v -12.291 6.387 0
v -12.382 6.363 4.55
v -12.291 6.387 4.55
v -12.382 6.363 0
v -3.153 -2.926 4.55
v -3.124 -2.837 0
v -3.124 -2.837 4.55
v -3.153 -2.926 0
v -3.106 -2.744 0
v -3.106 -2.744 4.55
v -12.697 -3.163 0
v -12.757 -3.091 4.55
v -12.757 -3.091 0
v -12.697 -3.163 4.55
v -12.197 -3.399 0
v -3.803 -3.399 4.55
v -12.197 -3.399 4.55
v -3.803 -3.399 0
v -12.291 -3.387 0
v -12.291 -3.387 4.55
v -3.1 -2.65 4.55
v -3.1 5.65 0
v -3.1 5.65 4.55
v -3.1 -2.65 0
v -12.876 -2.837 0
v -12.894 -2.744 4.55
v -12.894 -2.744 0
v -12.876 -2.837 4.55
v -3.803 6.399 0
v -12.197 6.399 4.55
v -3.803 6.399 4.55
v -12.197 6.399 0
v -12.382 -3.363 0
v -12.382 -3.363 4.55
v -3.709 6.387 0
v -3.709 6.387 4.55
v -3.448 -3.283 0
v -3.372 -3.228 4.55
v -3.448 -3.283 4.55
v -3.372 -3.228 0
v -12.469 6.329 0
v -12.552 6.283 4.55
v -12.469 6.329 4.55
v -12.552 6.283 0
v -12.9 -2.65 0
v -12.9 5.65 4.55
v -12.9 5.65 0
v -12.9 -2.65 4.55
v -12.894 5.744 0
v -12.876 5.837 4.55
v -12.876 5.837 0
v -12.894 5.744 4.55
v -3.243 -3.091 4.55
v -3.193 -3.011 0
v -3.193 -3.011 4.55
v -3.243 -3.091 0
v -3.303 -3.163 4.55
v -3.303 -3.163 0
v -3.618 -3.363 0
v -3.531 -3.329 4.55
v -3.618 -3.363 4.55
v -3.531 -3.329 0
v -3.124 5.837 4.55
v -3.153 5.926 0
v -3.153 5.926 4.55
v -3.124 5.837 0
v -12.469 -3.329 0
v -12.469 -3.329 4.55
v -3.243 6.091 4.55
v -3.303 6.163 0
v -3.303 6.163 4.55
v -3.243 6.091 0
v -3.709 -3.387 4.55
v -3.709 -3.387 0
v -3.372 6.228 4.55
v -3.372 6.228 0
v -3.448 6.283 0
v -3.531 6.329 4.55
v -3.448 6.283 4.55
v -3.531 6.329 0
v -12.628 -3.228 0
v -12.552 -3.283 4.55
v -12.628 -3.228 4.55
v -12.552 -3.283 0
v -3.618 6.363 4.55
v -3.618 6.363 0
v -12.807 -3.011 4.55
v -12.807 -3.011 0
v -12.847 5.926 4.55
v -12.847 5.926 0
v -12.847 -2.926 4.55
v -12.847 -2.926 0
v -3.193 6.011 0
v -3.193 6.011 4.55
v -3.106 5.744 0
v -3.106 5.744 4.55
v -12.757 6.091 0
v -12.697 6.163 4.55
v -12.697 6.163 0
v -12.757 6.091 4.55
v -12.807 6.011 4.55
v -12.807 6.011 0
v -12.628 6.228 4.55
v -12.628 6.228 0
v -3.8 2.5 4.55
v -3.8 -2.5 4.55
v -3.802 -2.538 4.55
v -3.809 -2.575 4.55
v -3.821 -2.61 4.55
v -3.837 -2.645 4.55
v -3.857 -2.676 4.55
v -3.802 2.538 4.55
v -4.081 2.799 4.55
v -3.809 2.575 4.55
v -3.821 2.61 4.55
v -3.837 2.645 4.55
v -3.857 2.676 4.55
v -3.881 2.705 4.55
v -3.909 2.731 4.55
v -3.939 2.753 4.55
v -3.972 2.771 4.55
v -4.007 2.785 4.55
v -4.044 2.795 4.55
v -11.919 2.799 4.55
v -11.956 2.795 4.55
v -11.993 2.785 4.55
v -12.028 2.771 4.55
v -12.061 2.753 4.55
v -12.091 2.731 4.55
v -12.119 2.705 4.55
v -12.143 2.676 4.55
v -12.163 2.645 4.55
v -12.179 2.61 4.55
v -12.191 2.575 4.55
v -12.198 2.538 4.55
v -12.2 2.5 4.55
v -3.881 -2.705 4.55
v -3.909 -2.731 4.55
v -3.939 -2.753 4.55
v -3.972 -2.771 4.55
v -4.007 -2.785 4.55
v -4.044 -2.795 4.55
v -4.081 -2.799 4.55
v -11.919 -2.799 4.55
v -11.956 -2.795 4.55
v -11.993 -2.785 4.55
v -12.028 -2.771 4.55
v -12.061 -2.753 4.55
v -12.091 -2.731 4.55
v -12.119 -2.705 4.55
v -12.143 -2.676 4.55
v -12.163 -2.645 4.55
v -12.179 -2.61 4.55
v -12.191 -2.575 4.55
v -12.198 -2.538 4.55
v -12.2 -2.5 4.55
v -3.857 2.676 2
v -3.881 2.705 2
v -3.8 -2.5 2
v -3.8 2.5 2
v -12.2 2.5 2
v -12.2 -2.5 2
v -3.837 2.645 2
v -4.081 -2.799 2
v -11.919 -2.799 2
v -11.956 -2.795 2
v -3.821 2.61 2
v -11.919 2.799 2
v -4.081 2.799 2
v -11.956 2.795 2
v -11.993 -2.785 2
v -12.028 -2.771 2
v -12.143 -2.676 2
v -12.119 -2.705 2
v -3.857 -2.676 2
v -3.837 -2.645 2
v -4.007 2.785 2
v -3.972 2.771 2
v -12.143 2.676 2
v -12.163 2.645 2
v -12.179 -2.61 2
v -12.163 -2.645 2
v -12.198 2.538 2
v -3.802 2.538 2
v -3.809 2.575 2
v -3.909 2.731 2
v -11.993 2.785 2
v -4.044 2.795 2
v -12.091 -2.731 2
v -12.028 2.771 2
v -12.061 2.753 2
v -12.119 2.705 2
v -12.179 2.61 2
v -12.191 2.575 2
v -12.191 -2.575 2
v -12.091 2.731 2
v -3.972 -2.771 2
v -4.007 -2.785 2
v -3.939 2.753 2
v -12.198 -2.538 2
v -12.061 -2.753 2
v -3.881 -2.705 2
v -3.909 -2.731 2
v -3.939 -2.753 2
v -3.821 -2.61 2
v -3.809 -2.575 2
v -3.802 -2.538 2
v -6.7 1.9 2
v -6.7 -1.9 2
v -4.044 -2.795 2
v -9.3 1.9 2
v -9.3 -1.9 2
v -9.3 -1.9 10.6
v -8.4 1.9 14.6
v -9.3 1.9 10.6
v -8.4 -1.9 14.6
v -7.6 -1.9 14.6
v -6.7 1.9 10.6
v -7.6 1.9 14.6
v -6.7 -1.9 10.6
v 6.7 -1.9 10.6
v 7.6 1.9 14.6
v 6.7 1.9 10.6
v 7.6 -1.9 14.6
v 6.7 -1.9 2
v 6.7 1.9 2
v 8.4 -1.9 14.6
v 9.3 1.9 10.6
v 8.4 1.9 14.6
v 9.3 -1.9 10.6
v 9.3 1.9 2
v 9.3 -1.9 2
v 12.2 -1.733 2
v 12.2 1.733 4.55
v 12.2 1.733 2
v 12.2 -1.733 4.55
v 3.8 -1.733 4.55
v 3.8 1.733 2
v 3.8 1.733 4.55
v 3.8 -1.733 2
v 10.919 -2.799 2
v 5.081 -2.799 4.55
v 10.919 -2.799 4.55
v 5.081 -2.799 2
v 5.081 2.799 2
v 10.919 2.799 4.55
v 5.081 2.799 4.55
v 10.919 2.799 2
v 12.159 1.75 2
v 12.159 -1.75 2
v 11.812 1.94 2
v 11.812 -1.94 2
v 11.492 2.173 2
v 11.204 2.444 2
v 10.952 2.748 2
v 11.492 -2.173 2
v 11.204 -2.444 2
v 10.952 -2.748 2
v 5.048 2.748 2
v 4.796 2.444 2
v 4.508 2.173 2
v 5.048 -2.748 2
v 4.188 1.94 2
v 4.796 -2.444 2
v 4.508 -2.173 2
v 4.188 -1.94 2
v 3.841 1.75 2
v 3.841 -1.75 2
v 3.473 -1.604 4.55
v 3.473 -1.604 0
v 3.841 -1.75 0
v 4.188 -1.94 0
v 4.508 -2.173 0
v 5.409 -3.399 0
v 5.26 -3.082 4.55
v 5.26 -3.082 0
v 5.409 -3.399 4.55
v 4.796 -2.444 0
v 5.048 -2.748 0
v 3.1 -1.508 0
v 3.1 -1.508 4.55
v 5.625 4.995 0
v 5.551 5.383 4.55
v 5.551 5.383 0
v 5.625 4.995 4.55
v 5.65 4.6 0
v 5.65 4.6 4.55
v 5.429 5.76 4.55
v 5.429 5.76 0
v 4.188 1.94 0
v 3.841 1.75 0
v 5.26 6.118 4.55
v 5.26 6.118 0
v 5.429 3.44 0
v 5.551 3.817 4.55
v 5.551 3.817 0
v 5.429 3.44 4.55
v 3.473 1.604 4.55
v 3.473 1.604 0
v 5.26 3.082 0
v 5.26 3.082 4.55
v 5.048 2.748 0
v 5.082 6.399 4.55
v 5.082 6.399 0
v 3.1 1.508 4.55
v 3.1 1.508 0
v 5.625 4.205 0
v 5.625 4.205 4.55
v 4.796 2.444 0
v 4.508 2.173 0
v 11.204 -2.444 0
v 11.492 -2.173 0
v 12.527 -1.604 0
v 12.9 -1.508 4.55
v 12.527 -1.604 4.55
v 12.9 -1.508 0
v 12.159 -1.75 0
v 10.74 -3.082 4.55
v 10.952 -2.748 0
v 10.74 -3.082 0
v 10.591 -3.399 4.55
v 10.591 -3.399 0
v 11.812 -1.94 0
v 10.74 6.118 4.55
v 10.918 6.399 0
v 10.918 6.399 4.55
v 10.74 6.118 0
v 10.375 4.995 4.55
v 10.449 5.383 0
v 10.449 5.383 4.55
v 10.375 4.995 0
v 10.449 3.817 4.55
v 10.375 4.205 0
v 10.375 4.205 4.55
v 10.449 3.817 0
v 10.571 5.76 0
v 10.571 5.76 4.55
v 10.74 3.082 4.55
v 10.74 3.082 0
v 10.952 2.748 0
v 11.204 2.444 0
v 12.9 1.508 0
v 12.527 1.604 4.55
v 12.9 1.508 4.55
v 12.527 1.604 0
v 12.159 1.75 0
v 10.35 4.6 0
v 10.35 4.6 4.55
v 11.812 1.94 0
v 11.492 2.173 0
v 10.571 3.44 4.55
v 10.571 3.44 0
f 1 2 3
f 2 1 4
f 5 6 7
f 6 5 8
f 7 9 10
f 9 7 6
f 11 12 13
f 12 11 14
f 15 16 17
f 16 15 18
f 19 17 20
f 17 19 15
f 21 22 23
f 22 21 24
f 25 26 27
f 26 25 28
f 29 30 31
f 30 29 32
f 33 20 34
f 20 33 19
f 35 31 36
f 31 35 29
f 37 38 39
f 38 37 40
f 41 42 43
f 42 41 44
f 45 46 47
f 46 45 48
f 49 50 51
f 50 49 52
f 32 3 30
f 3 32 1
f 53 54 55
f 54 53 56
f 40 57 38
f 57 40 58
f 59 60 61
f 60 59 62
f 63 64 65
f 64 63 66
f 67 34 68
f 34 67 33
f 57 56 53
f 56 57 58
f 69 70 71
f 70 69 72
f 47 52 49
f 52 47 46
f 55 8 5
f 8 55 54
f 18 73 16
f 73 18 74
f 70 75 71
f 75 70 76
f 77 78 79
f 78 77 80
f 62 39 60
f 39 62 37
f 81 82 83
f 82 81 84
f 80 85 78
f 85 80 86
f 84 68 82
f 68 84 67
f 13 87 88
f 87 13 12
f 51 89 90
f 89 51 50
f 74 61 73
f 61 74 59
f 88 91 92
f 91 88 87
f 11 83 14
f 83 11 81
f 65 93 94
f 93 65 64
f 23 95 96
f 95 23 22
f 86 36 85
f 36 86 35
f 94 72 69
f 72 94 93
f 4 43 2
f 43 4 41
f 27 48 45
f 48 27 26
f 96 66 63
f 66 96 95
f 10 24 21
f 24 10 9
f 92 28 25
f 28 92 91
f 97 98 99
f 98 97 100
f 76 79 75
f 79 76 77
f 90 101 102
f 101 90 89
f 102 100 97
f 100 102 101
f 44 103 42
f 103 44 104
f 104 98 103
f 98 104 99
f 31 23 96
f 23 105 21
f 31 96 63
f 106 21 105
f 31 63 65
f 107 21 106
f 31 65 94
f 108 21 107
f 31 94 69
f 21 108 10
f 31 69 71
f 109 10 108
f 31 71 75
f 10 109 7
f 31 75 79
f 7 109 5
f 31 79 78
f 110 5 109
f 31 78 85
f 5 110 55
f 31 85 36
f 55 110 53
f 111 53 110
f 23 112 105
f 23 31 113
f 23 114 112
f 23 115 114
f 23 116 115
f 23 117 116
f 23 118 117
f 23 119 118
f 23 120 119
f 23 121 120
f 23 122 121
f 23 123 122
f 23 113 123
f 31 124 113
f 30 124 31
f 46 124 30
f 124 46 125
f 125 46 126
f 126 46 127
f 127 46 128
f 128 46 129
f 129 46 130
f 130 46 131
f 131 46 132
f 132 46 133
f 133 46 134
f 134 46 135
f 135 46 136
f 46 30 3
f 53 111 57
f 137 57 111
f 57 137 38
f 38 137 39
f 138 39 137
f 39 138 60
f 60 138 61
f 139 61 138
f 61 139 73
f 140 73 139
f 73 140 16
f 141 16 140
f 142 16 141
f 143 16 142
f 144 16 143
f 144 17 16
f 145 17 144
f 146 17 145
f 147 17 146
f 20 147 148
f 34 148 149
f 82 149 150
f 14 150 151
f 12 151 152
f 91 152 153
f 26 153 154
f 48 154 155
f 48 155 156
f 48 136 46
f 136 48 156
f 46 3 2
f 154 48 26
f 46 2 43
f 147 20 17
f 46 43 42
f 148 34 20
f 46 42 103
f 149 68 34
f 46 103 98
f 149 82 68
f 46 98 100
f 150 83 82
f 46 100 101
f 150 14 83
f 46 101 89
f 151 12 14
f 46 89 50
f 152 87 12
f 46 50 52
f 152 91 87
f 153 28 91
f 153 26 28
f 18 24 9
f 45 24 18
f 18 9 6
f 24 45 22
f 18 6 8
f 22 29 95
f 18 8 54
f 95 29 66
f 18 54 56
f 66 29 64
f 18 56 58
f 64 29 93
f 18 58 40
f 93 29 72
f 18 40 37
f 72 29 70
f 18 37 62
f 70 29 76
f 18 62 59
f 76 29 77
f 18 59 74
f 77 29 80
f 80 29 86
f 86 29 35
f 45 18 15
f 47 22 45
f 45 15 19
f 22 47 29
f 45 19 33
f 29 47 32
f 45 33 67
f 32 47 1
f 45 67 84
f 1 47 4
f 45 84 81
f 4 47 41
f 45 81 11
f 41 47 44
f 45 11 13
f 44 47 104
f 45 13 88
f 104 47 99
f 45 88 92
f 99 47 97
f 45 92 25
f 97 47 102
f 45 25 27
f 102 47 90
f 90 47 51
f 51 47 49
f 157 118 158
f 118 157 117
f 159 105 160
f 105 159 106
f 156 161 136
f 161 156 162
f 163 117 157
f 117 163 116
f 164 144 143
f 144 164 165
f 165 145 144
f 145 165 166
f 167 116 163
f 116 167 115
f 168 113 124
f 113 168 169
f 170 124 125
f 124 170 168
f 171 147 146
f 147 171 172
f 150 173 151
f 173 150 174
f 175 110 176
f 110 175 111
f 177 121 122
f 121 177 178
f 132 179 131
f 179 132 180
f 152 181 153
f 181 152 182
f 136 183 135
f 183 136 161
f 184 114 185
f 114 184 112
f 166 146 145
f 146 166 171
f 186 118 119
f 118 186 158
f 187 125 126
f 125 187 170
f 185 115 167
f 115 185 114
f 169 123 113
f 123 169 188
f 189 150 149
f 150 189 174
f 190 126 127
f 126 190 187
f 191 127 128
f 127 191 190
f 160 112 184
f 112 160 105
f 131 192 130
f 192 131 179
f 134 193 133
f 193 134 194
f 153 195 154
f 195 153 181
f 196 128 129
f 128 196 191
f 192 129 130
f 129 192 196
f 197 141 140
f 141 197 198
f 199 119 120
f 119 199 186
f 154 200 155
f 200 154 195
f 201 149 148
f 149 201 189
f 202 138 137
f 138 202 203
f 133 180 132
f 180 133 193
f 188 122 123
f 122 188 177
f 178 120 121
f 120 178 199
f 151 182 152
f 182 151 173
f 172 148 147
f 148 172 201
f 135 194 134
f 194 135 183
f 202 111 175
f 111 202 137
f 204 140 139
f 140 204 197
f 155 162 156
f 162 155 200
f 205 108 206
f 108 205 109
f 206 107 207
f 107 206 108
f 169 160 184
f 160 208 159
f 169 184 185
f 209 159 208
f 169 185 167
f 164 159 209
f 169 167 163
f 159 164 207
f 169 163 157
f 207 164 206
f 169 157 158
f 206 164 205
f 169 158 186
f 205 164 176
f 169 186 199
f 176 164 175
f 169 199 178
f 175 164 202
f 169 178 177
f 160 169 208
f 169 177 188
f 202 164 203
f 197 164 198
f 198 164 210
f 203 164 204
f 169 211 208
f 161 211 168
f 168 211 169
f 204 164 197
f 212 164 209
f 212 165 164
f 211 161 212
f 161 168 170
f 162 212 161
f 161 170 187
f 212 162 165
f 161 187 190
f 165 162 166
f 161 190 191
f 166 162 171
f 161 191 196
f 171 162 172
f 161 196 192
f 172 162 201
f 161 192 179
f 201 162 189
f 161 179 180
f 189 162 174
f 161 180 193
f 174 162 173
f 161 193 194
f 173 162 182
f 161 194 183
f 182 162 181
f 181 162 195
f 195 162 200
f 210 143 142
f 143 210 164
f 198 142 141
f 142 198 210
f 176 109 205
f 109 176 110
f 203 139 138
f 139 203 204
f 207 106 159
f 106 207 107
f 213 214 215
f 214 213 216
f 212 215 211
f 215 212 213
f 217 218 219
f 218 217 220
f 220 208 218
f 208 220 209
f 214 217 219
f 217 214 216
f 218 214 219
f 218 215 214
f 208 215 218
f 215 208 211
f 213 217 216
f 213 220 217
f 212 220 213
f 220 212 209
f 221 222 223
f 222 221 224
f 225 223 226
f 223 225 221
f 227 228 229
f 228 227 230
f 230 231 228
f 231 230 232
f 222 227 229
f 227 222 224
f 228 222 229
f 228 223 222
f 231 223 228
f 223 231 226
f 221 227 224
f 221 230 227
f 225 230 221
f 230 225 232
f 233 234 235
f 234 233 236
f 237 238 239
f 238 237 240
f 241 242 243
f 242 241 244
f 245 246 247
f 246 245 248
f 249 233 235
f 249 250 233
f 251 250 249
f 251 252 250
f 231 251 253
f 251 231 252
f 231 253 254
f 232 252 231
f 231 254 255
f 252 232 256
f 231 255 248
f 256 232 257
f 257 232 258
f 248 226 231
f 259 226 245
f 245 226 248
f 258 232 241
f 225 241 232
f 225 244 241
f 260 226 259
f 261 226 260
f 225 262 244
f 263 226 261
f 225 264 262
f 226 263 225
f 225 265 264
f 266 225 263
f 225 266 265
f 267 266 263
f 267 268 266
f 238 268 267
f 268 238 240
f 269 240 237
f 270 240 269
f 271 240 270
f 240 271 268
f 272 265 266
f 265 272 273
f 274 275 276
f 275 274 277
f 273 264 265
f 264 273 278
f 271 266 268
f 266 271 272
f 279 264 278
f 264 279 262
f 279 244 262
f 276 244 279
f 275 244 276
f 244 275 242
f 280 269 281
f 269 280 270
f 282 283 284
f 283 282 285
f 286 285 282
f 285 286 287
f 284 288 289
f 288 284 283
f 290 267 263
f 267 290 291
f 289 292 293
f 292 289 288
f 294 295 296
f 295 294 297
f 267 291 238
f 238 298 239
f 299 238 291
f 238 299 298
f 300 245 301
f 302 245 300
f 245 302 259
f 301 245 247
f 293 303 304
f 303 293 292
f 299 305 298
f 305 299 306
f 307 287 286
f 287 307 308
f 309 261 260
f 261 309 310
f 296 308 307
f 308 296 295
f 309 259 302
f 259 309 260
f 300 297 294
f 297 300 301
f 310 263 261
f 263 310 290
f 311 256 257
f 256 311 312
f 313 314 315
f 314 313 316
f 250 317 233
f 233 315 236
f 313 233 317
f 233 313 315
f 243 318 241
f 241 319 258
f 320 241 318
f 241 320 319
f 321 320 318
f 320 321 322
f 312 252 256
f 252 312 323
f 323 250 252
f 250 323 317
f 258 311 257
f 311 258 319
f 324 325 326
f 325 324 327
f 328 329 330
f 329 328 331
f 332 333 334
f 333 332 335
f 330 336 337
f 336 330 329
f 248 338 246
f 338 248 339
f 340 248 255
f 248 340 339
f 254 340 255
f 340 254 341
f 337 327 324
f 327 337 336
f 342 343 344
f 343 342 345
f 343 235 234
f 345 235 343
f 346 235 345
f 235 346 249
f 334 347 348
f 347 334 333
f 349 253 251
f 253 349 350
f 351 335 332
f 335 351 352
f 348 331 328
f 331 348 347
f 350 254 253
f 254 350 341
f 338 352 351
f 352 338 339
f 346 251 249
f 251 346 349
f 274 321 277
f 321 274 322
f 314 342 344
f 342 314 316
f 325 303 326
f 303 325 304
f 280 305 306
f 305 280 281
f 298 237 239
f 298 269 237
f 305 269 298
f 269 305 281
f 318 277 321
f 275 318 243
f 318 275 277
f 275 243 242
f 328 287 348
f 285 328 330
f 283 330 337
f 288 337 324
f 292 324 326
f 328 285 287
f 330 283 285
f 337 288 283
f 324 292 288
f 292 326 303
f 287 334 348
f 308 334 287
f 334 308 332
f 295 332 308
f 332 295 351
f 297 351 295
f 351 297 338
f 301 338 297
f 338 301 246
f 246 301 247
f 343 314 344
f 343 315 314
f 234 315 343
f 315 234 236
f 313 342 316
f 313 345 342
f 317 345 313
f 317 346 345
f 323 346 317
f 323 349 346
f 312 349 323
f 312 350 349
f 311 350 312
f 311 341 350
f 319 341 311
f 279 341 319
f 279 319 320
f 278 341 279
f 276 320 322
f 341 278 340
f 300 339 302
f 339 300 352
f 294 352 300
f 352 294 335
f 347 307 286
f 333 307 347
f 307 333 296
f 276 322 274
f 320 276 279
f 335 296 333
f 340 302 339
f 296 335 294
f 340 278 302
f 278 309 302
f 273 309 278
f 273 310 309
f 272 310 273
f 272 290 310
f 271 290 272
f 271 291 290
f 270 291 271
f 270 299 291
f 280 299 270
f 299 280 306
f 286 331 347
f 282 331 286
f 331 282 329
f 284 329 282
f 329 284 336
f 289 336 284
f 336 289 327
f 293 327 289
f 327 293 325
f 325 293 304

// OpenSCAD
translate([-8,0,0]) { 
// Archived geometry from ../../validation_v7_joiners/previous_current/parts/oobb_organization_storage_drawer_unit_rectangle_100_ml_tamper_evident_systempak_209_container_1_column_2_row_ai_version_7_style_unit_1_wide_2_tall/front_plug_square.scad
$fn = 50;

difference() {
	union() {
		translate(v = [0, 0, 0]) {
			rotate(a = [0, 0, 0]) {
				difference() {
					union() {
						translate(v = [0, 0, 0]) {
							rotate(a = [0, 0, 0]) {
								difference() {
									union() {
										translate(v = [0, 0, 0]) {
											rotate(a = [0, 0, 0]) {
												difference() {
													union() {
														translate(v = [0, 1.5, 0]) {
															hull() {
																translate(v = [-4.15, 4.15, 0]) {
																	cylinder(h = 4.55, r = 0.75);
																}
																translate(v = [4.15, 4.15, 0]) {
																	cylinder(h = 4.55, r = 0.75);
																}
																translate(v = [-4.15, -4.15, 0]) {
																	cylinder(h = 4.55, r = 0.75);
																}
																translate(v = [4.15, -4.15, 0]) {
																	cylinder(h = 4.55, r = 0.75);
																}
															}
														}
													}
													union() {
														translate(v = [0, 0, 2.0]) {
															hull() {
																translate(v = [-3.9000000000000004, 2.5, 0]) {
																	cylinder(h = 2.65, r = 0.3);
																}
																translate(v = [3.9000000000000004, 2.5, 0]) {
																	cylinder(h = 2.65, r = 0.3);
																}
																translate(v = [-3.9000000000000004, -2.5, 0]) {
																	cylinder(h = 2.65, r = 0.3);
																}
																translate(v = [3.9000000000000004, -2.5, 0]) {
																	cylinder(h = 2.65, r = 0.3);
																}
															}
														}
													}
												}
											}
										}
										translate(v = [0, 0, 0]) {
											rotate(a = [0, 0, 0]) {
												difference() {
													union() {
														translate(v = [-1.4000000000000001, -1.9, 1.95]) {
															cube(size = [2.8000000000000003, 3.8, 12.65]);
														}
													}
													union() {
														translate(v = [0, 2.0, 0]) {
															rotate(a = [90, 0, 0]) {
																linear_extrude(height = 4.0) {
																	polygon(points = [[-1.3, 1.85], [-1.3, 10.6], [-0.4, 14.6], [-0.4, 14.799999999999999], [-1.6, 14.799999999999999], [-1.6, 1.85]]);
																}
															}
														}
														translate(v = [0, 2.0, 0]) {
															rotate(a = [90, 0, 0]) {
																linear_extrude(height = 4.0) {
																	polygon(points = [[1.3, 1.85], [1.3, 10.6], [0.4, 14.6], [0.4, 14.799999999999999], [1.6, 14.799999999999999], [1.6, 1.85]]);
																}
															}
														}
													}
												}
											}
										}
									}
									union();
								}
							}
						}
					}
					union();
				}
			}
		}
	}
	union();
}
 }
translate([8,0,0]) { 
// Archived geometry from ../../validation_v7_joiners/previous_current/parts/oobb_organization_storage_drawer_unit_rectangle_100_ml_tamper_evident_systempak_209_container_1_column_2_row_ai_version_7_style_unit_1_wide_2_tall/front_plug.scad
$fn = 50;

difference() {
	union() {
		translate(v = [0, 0, 0]) {
			rotate(a = [0, 0, 0]) {
				difference() {
					union() {
						translate(v = [0, 0, 0]) {
							rotate(a = [0, 0, 0]) {
								difference() {
									union() {
										translate(v = [0, 0, 0]) {
											rotate(a = [0, 0, 0]) {
												difference() {
													union() {
														translate(v = [0, 1.5, 0]) {
															hull() {
																translate(v = [-4.15, 4.15, 0]) {
																	cylinder(h = 4.55, r = 0.75);
																}
																translate(v = [4.15, 4.15, 0]) {
																	cylinder(h = 4.55, r = 0.75);
																}
																translate(v = [-4.15, -4.15, 0]) {
																	cylinder(h = 4.55, r = 0.75);
																}
																translate(v = [4.15, -4.15, 0]) {
																	cylinder(h = 4.55, r = 0.75);
																}
															}
														}
													}
													union() {
														translate(v = [0, 0, 2.0]) {
															hull() {
																translate(v = [-3.9000000000000004, 2.5, 0]) {
																	cylinder(h = 2.65, r = 0.3);
																}
																translate(v = [3.9000000000000004, 2.5, 0]) {
																	cylinder(h = 2.65, r = 0.3);
																}
																translate(v = [-3.9000000000000004, -2.5, 0]) {
																	cylinder(h = 2.65, r = 0.3);
																}
																translate(v = [3.9000000000000004, -2.5, 0]) {
																	cylinder(h = 2.65, r = 0.3);
																}
															}
														}
														translate(v = [-5.5, -4.6, -0.1]) {
															cylinder(h = 4.75, r = 3.15);
														}
														translate(v = [-5.5, 4.6, -0.1]) {
															cylinder(h = 4.75, r = 3.15);
														}
														translate(v = [5.5, -4.6, -0.1]) {
															cylinder(h = 4.75, r = 3.15);
														}
														translate(v = [5.5, 4.6, -0.1]) {
															cylinder(h = 4.75, r = 3.15);
														}
													}
												}
											}
										}
										translate(v = [0, 0, 0]) {
											rotate(a = [0, 0, 0]) {
												difference() {
													union() {
														translate(v = [-1.4000000000000001, -1.9, 1.95]) {
															cube(size = [2.8000000000000003, 3.8, 12.65]);
														}
													}
													union() {
														translate(v = [0, 2.0, 0]) {
															rotate(a = [90, 0, 0]) {
																linear_extrude(height = 4.0) {
																	polygon(points = [[-1.3, 1.85], [-1.3, 10.6], [-0.4, 14.6], [-0.4, 14.799999999999999], [-1.6, 14.799999999999999], [-1.6, 1.85]]);
																}
															}
														}
														translate(v = [0, 2.0, 0]) {
															rotate(a = [90, 0, 0]) {
																linear_extrude(height = 4.0) {
																	polygon(points = [[1.3, 1.85], [1.3, 10.6], [0.4, 14.6], [0.4, 14.799999999999999], [1.6, 14.799999999999999], [1.6, 1.85]]);
																}
															}
														}
													}
												}
											}
										}
									}
									union();
								}
							}
						}
					}
					union();
				}
			}
		}
	}
	union();
}
 }
